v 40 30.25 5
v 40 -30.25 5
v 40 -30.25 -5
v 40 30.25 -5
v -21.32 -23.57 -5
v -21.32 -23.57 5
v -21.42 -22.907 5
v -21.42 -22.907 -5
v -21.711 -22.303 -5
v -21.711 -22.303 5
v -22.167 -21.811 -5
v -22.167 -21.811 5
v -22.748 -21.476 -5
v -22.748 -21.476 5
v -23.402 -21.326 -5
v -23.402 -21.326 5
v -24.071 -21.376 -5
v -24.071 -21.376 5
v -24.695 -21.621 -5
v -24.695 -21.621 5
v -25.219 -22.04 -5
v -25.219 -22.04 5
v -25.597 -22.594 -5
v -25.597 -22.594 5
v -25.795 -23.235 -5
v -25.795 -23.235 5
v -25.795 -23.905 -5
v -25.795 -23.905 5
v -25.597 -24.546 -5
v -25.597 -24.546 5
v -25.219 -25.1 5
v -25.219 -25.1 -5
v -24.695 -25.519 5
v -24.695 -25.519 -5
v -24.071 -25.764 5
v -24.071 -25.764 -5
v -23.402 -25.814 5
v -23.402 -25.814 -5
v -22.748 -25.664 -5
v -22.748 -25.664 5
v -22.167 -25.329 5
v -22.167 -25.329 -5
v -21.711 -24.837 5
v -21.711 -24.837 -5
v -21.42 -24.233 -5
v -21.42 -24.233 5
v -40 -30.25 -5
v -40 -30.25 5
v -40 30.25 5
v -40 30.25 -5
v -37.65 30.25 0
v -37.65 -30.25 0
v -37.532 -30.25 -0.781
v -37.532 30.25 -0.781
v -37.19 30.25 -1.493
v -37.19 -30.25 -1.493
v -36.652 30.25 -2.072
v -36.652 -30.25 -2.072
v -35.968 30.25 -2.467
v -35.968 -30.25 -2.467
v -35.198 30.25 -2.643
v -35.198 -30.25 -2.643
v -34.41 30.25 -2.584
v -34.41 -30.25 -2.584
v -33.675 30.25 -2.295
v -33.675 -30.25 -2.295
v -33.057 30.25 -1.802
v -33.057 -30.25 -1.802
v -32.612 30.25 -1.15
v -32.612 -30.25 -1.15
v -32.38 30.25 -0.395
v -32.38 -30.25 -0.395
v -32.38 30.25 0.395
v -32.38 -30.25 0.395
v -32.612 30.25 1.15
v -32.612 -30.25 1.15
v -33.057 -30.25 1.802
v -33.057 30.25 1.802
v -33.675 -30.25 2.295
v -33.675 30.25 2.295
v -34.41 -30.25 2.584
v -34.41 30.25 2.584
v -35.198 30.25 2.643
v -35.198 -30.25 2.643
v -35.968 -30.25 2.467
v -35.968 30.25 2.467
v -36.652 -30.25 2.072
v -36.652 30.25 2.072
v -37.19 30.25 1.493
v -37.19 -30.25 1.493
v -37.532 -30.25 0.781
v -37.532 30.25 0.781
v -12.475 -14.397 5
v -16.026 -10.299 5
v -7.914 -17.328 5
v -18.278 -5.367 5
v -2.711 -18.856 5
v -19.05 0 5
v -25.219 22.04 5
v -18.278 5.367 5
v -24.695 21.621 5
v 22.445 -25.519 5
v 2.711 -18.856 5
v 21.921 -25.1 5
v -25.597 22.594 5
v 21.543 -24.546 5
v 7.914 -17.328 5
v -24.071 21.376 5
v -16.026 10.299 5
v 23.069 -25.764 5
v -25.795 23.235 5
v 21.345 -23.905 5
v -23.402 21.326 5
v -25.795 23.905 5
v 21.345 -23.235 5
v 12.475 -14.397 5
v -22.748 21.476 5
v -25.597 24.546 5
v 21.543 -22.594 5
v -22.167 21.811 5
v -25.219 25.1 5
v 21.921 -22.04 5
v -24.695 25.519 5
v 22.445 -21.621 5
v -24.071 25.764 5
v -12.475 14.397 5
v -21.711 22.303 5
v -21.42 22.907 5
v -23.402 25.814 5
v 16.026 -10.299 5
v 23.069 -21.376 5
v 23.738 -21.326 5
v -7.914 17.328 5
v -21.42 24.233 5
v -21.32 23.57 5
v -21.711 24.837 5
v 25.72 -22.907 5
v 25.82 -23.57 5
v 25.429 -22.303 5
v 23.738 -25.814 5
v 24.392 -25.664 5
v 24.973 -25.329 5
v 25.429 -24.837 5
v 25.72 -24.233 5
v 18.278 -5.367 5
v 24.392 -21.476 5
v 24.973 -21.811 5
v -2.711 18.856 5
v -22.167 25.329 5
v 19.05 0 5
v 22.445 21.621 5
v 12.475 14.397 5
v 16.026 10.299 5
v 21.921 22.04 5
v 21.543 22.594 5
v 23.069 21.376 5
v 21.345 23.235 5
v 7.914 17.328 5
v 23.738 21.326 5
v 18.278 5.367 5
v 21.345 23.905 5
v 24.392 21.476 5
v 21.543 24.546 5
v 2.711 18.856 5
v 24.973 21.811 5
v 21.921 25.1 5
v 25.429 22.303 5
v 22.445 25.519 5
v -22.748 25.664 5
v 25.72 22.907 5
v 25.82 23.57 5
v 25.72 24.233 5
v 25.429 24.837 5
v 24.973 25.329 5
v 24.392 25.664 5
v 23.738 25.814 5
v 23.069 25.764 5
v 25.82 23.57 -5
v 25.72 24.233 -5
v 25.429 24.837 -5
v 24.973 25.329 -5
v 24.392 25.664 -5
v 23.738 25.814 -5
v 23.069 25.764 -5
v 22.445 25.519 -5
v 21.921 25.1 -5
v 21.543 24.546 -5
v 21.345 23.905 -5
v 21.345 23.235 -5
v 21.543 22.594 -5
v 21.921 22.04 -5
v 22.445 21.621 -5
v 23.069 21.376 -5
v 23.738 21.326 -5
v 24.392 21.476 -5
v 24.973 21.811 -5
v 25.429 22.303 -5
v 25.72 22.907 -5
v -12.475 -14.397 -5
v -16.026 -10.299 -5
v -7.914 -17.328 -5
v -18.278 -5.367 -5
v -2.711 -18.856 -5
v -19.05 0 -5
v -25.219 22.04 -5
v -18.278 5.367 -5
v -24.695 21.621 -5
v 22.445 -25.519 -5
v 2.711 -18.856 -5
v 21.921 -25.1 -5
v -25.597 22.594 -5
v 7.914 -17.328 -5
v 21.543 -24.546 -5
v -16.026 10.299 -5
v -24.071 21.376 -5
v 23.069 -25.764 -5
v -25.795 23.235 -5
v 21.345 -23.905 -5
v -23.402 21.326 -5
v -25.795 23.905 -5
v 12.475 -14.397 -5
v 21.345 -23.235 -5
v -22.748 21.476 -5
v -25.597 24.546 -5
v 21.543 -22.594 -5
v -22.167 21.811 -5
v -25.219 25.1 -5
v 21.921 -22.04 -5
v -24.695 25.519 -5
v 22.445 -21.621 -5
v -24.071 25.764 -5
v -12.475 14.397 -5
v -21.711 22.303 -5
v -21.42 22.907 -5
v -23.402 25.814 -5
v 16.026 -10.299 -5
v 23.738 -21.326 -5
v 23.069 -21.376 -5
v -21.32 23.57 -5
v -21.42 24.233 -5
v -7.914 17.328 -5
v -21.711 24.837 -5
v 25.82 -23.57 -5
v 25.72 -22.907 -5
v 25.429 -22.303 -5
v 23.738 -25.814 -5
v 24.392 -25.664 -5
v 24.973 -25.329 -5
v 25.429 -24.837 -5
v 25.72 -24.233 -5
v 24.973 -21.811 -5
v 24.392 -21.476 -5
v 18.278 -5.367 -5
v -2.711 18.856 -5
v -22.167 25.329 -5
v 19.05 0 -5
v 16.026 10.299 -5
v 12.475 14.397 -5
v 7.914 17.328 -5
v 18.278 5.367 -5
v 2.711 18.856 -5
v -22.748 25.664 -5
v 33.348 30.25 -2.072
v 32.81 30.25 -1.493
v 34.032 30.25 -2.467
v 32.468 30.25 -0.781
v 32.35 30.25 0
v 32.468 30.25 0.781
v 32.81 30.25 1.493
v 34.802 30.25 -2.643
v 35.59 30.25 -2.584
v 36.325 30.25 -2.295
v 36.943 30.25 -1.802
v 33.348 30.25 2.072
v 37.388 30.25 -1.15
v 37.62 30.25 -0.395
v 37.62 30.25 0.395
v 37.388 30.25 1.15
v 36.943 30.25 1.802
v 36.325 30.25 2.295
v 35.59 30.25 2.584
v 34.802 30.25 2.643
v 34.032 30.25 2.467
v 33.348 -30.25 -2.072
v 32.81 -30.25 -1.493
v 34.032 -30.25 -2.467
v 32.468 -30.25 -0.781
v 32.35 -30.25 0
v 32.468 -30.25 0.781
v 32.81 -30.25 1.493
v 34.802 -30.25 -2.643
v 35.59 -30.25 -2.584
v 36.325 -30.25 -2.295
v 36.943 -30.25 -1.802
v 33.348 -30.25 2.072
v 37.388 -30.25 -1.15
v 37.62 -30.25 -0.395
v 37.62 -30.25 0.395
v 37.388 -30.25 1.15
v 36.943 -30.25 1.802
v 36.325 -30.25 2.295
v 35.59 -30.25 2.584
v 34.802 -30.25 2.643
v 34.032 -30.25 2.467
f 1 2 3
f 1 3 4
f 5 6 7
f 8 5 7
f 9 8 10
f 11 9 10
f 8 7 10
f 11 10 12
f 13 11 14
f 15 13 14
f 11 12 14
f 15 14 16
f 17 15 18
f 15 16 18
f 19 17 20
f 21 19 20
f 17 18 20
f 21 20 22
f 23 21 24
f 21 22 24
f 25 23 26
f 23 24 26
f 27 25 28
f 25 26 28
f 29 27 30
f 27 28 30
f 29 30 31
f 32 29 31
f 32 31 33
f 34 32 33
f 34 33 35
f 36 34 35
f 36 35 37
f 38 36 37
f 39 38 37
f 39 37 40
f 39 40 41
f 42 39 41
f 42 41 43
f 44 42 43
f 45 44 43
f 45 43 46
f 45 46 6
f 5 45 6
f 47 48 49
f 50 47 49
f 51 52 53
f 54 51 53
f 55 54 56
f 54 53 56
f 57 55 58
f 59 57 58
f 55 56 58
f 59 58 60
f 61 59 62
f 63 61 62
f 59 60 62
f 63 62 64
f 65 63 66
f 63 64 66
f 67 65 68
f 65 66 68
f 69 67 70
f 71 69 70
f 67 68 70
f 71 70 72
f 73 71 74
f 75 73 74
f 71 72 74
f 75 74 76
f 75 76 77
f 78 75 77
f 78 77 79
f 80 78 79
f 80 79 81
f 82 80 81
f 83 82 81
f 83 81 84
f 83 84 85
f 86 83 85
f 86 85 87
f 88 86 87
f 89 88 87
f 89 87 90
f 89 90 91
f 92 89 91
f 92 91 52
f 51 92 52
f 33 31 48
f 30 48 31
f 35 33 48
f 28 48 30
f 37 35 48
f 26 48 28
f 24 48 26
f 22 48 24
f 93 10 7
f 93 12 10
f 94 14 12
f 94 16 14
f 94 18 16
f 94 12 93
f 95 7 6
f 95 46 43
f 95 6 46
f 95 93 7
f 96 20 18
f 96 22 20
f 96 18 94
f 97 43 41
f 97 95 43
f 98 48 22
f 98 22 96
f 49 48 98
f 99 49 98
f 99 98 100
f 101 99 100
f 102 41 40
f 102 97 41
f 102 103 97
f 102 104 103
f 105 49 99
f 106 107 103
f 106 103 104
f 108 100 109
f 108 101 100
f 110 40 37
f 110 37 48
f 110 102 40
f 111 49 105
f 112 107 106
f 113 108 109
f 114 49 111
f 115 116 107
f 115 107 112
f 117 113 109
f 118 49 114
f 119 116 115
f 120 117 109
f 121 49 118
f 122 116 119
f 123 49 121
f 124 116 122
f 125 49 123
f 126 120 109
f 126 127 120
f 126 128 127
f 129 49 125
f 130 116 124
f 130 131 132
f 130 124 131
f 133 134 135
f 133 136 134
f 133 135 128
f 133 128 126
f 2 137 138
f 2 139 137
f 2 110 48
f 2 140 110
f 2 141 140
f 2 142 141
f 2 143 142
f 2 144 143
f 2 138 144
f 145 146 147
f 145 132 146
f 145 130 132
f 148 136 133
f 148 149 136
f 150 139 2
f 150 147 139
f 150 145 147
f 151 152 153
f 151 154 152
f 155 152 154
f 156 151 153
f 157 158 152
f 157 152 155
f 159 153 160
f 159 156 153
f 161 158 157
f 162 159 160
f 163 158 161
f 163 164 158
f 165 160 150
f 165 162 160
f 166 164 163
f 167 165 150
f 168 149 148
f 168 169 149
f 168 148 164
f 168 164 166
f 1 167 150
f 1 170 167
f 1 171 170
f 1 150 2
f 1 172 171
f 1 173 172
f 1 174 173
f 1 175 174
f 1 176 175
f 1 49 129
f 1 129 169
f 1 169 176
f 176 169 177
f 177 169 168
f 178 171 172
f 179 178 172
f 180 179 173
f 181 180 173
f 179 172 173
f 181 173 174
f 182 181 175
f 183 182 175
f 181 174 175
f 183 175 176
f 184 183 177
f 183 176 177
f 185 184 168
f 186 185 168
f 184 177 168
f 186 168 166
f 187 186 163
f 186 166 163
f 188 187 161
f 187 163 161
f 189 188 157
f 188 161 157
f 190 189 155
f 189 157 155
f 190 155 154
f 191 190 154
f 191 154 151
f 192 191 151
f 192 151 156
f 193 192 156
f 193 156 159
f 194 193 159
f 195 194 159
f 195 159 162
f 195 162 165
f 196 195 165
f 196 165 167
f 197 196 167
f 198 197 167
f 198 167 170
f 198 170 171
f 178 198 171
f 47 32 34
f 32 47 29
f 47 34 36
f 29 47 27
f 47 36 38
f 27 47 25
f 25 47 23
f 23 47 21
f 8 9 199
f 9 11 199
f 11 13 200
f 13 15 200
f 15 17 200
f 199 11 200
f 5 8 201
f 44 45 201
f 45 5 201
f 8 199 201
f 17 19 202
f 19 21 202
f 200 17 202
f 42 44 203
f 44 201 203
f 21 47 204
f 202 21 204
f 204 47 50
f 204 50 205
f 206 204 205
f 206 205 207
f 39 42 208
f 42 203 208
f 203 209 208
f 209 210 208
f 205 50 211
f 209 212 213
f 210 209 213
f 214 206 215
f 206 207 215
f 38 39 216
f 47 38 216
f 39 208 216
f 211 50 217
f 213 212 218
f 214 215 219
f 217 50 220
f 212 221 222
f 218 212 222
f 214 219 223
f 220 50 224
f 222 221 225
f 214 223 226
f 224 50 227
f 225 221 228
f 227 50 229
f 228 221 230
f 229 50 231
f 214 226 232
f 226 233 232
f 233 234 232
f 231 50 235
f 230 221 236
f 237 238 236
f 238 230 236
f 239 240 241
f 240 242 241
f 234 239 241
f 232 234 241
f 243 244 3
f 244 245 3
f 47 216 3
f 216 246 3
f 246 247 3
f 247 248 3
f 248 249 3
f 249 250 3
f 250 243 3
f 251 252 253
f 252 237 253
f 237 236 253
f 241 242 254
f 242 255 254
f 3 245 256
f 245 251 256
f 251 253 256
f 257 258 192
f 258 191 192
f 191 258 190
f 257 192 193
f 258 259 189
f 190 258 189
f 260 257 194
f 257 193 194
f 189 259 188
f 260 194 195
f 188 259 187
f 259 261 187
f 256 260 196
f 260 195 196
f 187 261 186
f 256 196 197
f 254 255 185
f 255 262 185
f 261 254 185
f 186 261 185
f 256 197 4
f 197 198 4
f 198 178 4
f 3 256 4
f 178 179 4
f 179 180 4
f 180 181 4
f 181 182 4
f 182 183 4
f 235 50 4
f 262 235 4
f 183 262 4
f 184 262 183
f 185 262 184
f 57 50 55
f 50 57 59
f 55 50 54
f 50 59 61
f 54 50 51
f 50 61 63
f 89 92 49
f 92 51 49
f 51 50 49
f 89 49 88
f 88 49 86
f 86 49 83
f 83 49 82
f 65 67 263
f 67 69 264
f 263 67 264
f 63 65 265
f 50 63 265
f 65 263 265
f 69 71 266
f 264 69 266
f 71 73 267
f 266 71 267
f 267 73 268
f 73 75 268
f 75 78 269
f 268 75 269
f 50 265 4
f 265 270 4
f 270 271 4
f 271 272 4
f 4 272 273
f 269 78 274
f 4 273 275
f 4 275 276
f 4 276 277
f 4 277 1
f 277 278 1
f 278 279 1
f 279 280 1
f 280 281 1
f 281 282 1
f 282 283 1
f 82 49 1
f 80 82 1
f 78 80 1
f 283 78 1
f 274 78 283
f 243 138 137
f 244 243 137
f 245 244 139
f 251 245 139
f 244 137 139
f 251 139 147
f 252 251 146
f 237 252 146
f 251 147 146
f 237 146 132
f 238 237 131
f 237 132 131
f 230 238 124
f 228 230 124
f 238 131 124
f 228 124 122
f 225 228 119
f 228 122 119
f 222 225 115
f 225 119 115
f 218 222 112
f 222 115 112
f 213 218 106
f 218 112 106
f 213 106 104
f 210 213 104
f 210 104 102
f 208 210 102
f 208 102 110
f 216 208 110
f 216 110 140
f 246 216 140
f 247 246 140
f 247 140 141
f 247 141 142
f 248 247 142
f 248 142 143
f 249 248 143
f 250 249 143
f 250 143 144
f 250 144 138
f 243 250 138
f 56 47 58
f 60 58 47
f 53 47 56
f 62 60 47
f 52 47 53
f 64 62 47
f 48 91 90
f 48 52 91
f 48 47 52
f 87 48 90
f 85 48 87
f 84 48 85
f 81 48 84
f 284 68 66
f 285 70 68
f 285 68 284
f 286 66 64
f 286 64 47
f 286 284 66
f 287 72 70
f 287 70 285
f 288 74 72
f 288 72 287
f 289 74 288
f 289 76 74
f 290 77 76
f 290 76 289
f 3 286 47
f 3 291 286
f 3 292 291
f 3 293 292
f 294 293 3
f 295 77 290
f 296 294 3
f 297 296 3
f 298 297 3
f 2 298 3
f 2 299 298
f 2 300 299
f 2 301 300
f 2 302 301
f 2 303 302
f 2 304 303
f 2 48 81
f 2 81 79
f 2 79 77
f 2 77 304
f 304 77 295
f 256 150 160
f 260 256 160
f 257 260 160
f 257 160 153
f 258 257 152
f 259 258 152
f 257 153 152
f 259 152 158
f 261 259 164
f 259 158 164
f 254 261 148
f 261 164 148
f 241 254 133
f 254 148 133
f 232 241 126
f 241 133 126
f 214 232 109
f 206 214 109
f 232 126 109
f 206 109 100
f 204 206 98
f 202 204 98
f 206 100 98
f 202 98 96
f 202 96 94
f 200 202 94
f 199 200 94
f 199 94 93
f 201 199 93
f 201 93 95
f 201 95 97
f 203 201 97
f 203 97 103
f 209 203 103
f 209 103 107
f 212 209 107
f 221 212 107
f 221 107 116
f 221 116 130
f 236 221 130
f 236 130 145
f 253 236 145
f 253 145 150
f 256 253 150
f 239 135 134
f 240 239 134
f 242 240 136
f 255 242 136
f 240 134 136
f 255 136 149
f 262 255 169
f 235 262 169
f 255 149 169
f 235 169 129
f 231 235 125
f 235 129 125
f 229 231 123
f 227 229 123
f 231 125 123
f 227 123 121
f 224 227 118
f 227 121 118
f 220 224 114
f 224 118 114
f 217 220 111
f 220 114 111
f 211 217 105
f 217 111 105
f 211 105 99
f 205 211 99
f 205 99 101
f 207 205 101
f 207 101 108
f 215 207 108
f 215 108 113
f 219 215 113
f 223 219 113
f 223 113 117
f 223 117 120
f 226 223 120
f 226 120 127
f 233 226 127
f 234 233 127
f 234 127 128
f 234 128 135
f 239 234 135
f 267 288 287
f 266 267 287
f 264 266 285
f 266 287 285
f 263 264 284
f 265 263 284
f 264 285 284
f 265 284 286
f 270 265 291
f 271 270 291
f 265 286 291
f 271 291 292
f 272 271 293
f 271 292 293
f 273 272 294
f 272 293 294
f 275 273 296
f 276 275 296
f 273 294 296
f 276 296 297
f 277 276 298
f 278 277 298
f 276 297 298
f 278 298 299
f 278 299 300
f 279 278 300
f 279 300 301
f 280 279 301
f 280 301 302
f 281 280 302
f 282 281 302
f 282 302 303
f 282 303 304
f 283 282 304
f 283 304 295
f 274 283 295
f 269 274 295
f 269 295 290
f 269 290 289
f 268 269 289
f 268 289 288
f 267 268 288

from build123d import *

# Parameters (mm, degrees)
SKETCH_1_W          = 80
SKETCH_1_H          = 60.5
EXTRUDE_1_DEPTH     = 5
SKETCH_3_R          = 19.05
CUT_EXTRUDE_1_DEPTH = 52.137681801
HOLE_WIZARD_M4_1_D  = 4.5
HOLE_WIZARD_M5_1_D  = 5.3


with BuildPart() as part:
    # 草圖1 → 填料-伸長1 (new, symmetric)
    with BuildSketch(Plane.XY):
        Rectangle(SKETCH_1_W, SKETCH_1_H)
    extrude(amount=EXTRUDE_1_DEPTH, both=True)

    # 草圖3 → 除料-伸長1 (cut, through all)
    with BuildSketch(Plane.XY.offset(5)):
        Circle(SKETCH_3_R)
    extrude(amount=-CUT_EXTRUDE_1_DEPTH, mode=Mode.SUBTRACT)

    # M4 餘隙孔1 (through all)
    with Locations(Plane(origin=(0, 0, -5), x_dir=(-1, 0, 0), z_dir=(0, 0, -1))):
        with Locations((23.57, 23.57), (-23.57, -23.57), (-23.57, 23.57), (23.57, -23.57)):
            Hole(HOLE_WIZARD_M4_1_D / 2)

    # M5 餘隙孔1 (through all)
    with Locations(Plane(origin=(0, 30.25, 0), x_dir=(1, 0, 0), z_dir=(0, 1, 0))):
        with Locations((-35, 0), (35, 0)):
            Hole(HOLE_WIZARD_M5_1_D / 2)


solid = part.part
